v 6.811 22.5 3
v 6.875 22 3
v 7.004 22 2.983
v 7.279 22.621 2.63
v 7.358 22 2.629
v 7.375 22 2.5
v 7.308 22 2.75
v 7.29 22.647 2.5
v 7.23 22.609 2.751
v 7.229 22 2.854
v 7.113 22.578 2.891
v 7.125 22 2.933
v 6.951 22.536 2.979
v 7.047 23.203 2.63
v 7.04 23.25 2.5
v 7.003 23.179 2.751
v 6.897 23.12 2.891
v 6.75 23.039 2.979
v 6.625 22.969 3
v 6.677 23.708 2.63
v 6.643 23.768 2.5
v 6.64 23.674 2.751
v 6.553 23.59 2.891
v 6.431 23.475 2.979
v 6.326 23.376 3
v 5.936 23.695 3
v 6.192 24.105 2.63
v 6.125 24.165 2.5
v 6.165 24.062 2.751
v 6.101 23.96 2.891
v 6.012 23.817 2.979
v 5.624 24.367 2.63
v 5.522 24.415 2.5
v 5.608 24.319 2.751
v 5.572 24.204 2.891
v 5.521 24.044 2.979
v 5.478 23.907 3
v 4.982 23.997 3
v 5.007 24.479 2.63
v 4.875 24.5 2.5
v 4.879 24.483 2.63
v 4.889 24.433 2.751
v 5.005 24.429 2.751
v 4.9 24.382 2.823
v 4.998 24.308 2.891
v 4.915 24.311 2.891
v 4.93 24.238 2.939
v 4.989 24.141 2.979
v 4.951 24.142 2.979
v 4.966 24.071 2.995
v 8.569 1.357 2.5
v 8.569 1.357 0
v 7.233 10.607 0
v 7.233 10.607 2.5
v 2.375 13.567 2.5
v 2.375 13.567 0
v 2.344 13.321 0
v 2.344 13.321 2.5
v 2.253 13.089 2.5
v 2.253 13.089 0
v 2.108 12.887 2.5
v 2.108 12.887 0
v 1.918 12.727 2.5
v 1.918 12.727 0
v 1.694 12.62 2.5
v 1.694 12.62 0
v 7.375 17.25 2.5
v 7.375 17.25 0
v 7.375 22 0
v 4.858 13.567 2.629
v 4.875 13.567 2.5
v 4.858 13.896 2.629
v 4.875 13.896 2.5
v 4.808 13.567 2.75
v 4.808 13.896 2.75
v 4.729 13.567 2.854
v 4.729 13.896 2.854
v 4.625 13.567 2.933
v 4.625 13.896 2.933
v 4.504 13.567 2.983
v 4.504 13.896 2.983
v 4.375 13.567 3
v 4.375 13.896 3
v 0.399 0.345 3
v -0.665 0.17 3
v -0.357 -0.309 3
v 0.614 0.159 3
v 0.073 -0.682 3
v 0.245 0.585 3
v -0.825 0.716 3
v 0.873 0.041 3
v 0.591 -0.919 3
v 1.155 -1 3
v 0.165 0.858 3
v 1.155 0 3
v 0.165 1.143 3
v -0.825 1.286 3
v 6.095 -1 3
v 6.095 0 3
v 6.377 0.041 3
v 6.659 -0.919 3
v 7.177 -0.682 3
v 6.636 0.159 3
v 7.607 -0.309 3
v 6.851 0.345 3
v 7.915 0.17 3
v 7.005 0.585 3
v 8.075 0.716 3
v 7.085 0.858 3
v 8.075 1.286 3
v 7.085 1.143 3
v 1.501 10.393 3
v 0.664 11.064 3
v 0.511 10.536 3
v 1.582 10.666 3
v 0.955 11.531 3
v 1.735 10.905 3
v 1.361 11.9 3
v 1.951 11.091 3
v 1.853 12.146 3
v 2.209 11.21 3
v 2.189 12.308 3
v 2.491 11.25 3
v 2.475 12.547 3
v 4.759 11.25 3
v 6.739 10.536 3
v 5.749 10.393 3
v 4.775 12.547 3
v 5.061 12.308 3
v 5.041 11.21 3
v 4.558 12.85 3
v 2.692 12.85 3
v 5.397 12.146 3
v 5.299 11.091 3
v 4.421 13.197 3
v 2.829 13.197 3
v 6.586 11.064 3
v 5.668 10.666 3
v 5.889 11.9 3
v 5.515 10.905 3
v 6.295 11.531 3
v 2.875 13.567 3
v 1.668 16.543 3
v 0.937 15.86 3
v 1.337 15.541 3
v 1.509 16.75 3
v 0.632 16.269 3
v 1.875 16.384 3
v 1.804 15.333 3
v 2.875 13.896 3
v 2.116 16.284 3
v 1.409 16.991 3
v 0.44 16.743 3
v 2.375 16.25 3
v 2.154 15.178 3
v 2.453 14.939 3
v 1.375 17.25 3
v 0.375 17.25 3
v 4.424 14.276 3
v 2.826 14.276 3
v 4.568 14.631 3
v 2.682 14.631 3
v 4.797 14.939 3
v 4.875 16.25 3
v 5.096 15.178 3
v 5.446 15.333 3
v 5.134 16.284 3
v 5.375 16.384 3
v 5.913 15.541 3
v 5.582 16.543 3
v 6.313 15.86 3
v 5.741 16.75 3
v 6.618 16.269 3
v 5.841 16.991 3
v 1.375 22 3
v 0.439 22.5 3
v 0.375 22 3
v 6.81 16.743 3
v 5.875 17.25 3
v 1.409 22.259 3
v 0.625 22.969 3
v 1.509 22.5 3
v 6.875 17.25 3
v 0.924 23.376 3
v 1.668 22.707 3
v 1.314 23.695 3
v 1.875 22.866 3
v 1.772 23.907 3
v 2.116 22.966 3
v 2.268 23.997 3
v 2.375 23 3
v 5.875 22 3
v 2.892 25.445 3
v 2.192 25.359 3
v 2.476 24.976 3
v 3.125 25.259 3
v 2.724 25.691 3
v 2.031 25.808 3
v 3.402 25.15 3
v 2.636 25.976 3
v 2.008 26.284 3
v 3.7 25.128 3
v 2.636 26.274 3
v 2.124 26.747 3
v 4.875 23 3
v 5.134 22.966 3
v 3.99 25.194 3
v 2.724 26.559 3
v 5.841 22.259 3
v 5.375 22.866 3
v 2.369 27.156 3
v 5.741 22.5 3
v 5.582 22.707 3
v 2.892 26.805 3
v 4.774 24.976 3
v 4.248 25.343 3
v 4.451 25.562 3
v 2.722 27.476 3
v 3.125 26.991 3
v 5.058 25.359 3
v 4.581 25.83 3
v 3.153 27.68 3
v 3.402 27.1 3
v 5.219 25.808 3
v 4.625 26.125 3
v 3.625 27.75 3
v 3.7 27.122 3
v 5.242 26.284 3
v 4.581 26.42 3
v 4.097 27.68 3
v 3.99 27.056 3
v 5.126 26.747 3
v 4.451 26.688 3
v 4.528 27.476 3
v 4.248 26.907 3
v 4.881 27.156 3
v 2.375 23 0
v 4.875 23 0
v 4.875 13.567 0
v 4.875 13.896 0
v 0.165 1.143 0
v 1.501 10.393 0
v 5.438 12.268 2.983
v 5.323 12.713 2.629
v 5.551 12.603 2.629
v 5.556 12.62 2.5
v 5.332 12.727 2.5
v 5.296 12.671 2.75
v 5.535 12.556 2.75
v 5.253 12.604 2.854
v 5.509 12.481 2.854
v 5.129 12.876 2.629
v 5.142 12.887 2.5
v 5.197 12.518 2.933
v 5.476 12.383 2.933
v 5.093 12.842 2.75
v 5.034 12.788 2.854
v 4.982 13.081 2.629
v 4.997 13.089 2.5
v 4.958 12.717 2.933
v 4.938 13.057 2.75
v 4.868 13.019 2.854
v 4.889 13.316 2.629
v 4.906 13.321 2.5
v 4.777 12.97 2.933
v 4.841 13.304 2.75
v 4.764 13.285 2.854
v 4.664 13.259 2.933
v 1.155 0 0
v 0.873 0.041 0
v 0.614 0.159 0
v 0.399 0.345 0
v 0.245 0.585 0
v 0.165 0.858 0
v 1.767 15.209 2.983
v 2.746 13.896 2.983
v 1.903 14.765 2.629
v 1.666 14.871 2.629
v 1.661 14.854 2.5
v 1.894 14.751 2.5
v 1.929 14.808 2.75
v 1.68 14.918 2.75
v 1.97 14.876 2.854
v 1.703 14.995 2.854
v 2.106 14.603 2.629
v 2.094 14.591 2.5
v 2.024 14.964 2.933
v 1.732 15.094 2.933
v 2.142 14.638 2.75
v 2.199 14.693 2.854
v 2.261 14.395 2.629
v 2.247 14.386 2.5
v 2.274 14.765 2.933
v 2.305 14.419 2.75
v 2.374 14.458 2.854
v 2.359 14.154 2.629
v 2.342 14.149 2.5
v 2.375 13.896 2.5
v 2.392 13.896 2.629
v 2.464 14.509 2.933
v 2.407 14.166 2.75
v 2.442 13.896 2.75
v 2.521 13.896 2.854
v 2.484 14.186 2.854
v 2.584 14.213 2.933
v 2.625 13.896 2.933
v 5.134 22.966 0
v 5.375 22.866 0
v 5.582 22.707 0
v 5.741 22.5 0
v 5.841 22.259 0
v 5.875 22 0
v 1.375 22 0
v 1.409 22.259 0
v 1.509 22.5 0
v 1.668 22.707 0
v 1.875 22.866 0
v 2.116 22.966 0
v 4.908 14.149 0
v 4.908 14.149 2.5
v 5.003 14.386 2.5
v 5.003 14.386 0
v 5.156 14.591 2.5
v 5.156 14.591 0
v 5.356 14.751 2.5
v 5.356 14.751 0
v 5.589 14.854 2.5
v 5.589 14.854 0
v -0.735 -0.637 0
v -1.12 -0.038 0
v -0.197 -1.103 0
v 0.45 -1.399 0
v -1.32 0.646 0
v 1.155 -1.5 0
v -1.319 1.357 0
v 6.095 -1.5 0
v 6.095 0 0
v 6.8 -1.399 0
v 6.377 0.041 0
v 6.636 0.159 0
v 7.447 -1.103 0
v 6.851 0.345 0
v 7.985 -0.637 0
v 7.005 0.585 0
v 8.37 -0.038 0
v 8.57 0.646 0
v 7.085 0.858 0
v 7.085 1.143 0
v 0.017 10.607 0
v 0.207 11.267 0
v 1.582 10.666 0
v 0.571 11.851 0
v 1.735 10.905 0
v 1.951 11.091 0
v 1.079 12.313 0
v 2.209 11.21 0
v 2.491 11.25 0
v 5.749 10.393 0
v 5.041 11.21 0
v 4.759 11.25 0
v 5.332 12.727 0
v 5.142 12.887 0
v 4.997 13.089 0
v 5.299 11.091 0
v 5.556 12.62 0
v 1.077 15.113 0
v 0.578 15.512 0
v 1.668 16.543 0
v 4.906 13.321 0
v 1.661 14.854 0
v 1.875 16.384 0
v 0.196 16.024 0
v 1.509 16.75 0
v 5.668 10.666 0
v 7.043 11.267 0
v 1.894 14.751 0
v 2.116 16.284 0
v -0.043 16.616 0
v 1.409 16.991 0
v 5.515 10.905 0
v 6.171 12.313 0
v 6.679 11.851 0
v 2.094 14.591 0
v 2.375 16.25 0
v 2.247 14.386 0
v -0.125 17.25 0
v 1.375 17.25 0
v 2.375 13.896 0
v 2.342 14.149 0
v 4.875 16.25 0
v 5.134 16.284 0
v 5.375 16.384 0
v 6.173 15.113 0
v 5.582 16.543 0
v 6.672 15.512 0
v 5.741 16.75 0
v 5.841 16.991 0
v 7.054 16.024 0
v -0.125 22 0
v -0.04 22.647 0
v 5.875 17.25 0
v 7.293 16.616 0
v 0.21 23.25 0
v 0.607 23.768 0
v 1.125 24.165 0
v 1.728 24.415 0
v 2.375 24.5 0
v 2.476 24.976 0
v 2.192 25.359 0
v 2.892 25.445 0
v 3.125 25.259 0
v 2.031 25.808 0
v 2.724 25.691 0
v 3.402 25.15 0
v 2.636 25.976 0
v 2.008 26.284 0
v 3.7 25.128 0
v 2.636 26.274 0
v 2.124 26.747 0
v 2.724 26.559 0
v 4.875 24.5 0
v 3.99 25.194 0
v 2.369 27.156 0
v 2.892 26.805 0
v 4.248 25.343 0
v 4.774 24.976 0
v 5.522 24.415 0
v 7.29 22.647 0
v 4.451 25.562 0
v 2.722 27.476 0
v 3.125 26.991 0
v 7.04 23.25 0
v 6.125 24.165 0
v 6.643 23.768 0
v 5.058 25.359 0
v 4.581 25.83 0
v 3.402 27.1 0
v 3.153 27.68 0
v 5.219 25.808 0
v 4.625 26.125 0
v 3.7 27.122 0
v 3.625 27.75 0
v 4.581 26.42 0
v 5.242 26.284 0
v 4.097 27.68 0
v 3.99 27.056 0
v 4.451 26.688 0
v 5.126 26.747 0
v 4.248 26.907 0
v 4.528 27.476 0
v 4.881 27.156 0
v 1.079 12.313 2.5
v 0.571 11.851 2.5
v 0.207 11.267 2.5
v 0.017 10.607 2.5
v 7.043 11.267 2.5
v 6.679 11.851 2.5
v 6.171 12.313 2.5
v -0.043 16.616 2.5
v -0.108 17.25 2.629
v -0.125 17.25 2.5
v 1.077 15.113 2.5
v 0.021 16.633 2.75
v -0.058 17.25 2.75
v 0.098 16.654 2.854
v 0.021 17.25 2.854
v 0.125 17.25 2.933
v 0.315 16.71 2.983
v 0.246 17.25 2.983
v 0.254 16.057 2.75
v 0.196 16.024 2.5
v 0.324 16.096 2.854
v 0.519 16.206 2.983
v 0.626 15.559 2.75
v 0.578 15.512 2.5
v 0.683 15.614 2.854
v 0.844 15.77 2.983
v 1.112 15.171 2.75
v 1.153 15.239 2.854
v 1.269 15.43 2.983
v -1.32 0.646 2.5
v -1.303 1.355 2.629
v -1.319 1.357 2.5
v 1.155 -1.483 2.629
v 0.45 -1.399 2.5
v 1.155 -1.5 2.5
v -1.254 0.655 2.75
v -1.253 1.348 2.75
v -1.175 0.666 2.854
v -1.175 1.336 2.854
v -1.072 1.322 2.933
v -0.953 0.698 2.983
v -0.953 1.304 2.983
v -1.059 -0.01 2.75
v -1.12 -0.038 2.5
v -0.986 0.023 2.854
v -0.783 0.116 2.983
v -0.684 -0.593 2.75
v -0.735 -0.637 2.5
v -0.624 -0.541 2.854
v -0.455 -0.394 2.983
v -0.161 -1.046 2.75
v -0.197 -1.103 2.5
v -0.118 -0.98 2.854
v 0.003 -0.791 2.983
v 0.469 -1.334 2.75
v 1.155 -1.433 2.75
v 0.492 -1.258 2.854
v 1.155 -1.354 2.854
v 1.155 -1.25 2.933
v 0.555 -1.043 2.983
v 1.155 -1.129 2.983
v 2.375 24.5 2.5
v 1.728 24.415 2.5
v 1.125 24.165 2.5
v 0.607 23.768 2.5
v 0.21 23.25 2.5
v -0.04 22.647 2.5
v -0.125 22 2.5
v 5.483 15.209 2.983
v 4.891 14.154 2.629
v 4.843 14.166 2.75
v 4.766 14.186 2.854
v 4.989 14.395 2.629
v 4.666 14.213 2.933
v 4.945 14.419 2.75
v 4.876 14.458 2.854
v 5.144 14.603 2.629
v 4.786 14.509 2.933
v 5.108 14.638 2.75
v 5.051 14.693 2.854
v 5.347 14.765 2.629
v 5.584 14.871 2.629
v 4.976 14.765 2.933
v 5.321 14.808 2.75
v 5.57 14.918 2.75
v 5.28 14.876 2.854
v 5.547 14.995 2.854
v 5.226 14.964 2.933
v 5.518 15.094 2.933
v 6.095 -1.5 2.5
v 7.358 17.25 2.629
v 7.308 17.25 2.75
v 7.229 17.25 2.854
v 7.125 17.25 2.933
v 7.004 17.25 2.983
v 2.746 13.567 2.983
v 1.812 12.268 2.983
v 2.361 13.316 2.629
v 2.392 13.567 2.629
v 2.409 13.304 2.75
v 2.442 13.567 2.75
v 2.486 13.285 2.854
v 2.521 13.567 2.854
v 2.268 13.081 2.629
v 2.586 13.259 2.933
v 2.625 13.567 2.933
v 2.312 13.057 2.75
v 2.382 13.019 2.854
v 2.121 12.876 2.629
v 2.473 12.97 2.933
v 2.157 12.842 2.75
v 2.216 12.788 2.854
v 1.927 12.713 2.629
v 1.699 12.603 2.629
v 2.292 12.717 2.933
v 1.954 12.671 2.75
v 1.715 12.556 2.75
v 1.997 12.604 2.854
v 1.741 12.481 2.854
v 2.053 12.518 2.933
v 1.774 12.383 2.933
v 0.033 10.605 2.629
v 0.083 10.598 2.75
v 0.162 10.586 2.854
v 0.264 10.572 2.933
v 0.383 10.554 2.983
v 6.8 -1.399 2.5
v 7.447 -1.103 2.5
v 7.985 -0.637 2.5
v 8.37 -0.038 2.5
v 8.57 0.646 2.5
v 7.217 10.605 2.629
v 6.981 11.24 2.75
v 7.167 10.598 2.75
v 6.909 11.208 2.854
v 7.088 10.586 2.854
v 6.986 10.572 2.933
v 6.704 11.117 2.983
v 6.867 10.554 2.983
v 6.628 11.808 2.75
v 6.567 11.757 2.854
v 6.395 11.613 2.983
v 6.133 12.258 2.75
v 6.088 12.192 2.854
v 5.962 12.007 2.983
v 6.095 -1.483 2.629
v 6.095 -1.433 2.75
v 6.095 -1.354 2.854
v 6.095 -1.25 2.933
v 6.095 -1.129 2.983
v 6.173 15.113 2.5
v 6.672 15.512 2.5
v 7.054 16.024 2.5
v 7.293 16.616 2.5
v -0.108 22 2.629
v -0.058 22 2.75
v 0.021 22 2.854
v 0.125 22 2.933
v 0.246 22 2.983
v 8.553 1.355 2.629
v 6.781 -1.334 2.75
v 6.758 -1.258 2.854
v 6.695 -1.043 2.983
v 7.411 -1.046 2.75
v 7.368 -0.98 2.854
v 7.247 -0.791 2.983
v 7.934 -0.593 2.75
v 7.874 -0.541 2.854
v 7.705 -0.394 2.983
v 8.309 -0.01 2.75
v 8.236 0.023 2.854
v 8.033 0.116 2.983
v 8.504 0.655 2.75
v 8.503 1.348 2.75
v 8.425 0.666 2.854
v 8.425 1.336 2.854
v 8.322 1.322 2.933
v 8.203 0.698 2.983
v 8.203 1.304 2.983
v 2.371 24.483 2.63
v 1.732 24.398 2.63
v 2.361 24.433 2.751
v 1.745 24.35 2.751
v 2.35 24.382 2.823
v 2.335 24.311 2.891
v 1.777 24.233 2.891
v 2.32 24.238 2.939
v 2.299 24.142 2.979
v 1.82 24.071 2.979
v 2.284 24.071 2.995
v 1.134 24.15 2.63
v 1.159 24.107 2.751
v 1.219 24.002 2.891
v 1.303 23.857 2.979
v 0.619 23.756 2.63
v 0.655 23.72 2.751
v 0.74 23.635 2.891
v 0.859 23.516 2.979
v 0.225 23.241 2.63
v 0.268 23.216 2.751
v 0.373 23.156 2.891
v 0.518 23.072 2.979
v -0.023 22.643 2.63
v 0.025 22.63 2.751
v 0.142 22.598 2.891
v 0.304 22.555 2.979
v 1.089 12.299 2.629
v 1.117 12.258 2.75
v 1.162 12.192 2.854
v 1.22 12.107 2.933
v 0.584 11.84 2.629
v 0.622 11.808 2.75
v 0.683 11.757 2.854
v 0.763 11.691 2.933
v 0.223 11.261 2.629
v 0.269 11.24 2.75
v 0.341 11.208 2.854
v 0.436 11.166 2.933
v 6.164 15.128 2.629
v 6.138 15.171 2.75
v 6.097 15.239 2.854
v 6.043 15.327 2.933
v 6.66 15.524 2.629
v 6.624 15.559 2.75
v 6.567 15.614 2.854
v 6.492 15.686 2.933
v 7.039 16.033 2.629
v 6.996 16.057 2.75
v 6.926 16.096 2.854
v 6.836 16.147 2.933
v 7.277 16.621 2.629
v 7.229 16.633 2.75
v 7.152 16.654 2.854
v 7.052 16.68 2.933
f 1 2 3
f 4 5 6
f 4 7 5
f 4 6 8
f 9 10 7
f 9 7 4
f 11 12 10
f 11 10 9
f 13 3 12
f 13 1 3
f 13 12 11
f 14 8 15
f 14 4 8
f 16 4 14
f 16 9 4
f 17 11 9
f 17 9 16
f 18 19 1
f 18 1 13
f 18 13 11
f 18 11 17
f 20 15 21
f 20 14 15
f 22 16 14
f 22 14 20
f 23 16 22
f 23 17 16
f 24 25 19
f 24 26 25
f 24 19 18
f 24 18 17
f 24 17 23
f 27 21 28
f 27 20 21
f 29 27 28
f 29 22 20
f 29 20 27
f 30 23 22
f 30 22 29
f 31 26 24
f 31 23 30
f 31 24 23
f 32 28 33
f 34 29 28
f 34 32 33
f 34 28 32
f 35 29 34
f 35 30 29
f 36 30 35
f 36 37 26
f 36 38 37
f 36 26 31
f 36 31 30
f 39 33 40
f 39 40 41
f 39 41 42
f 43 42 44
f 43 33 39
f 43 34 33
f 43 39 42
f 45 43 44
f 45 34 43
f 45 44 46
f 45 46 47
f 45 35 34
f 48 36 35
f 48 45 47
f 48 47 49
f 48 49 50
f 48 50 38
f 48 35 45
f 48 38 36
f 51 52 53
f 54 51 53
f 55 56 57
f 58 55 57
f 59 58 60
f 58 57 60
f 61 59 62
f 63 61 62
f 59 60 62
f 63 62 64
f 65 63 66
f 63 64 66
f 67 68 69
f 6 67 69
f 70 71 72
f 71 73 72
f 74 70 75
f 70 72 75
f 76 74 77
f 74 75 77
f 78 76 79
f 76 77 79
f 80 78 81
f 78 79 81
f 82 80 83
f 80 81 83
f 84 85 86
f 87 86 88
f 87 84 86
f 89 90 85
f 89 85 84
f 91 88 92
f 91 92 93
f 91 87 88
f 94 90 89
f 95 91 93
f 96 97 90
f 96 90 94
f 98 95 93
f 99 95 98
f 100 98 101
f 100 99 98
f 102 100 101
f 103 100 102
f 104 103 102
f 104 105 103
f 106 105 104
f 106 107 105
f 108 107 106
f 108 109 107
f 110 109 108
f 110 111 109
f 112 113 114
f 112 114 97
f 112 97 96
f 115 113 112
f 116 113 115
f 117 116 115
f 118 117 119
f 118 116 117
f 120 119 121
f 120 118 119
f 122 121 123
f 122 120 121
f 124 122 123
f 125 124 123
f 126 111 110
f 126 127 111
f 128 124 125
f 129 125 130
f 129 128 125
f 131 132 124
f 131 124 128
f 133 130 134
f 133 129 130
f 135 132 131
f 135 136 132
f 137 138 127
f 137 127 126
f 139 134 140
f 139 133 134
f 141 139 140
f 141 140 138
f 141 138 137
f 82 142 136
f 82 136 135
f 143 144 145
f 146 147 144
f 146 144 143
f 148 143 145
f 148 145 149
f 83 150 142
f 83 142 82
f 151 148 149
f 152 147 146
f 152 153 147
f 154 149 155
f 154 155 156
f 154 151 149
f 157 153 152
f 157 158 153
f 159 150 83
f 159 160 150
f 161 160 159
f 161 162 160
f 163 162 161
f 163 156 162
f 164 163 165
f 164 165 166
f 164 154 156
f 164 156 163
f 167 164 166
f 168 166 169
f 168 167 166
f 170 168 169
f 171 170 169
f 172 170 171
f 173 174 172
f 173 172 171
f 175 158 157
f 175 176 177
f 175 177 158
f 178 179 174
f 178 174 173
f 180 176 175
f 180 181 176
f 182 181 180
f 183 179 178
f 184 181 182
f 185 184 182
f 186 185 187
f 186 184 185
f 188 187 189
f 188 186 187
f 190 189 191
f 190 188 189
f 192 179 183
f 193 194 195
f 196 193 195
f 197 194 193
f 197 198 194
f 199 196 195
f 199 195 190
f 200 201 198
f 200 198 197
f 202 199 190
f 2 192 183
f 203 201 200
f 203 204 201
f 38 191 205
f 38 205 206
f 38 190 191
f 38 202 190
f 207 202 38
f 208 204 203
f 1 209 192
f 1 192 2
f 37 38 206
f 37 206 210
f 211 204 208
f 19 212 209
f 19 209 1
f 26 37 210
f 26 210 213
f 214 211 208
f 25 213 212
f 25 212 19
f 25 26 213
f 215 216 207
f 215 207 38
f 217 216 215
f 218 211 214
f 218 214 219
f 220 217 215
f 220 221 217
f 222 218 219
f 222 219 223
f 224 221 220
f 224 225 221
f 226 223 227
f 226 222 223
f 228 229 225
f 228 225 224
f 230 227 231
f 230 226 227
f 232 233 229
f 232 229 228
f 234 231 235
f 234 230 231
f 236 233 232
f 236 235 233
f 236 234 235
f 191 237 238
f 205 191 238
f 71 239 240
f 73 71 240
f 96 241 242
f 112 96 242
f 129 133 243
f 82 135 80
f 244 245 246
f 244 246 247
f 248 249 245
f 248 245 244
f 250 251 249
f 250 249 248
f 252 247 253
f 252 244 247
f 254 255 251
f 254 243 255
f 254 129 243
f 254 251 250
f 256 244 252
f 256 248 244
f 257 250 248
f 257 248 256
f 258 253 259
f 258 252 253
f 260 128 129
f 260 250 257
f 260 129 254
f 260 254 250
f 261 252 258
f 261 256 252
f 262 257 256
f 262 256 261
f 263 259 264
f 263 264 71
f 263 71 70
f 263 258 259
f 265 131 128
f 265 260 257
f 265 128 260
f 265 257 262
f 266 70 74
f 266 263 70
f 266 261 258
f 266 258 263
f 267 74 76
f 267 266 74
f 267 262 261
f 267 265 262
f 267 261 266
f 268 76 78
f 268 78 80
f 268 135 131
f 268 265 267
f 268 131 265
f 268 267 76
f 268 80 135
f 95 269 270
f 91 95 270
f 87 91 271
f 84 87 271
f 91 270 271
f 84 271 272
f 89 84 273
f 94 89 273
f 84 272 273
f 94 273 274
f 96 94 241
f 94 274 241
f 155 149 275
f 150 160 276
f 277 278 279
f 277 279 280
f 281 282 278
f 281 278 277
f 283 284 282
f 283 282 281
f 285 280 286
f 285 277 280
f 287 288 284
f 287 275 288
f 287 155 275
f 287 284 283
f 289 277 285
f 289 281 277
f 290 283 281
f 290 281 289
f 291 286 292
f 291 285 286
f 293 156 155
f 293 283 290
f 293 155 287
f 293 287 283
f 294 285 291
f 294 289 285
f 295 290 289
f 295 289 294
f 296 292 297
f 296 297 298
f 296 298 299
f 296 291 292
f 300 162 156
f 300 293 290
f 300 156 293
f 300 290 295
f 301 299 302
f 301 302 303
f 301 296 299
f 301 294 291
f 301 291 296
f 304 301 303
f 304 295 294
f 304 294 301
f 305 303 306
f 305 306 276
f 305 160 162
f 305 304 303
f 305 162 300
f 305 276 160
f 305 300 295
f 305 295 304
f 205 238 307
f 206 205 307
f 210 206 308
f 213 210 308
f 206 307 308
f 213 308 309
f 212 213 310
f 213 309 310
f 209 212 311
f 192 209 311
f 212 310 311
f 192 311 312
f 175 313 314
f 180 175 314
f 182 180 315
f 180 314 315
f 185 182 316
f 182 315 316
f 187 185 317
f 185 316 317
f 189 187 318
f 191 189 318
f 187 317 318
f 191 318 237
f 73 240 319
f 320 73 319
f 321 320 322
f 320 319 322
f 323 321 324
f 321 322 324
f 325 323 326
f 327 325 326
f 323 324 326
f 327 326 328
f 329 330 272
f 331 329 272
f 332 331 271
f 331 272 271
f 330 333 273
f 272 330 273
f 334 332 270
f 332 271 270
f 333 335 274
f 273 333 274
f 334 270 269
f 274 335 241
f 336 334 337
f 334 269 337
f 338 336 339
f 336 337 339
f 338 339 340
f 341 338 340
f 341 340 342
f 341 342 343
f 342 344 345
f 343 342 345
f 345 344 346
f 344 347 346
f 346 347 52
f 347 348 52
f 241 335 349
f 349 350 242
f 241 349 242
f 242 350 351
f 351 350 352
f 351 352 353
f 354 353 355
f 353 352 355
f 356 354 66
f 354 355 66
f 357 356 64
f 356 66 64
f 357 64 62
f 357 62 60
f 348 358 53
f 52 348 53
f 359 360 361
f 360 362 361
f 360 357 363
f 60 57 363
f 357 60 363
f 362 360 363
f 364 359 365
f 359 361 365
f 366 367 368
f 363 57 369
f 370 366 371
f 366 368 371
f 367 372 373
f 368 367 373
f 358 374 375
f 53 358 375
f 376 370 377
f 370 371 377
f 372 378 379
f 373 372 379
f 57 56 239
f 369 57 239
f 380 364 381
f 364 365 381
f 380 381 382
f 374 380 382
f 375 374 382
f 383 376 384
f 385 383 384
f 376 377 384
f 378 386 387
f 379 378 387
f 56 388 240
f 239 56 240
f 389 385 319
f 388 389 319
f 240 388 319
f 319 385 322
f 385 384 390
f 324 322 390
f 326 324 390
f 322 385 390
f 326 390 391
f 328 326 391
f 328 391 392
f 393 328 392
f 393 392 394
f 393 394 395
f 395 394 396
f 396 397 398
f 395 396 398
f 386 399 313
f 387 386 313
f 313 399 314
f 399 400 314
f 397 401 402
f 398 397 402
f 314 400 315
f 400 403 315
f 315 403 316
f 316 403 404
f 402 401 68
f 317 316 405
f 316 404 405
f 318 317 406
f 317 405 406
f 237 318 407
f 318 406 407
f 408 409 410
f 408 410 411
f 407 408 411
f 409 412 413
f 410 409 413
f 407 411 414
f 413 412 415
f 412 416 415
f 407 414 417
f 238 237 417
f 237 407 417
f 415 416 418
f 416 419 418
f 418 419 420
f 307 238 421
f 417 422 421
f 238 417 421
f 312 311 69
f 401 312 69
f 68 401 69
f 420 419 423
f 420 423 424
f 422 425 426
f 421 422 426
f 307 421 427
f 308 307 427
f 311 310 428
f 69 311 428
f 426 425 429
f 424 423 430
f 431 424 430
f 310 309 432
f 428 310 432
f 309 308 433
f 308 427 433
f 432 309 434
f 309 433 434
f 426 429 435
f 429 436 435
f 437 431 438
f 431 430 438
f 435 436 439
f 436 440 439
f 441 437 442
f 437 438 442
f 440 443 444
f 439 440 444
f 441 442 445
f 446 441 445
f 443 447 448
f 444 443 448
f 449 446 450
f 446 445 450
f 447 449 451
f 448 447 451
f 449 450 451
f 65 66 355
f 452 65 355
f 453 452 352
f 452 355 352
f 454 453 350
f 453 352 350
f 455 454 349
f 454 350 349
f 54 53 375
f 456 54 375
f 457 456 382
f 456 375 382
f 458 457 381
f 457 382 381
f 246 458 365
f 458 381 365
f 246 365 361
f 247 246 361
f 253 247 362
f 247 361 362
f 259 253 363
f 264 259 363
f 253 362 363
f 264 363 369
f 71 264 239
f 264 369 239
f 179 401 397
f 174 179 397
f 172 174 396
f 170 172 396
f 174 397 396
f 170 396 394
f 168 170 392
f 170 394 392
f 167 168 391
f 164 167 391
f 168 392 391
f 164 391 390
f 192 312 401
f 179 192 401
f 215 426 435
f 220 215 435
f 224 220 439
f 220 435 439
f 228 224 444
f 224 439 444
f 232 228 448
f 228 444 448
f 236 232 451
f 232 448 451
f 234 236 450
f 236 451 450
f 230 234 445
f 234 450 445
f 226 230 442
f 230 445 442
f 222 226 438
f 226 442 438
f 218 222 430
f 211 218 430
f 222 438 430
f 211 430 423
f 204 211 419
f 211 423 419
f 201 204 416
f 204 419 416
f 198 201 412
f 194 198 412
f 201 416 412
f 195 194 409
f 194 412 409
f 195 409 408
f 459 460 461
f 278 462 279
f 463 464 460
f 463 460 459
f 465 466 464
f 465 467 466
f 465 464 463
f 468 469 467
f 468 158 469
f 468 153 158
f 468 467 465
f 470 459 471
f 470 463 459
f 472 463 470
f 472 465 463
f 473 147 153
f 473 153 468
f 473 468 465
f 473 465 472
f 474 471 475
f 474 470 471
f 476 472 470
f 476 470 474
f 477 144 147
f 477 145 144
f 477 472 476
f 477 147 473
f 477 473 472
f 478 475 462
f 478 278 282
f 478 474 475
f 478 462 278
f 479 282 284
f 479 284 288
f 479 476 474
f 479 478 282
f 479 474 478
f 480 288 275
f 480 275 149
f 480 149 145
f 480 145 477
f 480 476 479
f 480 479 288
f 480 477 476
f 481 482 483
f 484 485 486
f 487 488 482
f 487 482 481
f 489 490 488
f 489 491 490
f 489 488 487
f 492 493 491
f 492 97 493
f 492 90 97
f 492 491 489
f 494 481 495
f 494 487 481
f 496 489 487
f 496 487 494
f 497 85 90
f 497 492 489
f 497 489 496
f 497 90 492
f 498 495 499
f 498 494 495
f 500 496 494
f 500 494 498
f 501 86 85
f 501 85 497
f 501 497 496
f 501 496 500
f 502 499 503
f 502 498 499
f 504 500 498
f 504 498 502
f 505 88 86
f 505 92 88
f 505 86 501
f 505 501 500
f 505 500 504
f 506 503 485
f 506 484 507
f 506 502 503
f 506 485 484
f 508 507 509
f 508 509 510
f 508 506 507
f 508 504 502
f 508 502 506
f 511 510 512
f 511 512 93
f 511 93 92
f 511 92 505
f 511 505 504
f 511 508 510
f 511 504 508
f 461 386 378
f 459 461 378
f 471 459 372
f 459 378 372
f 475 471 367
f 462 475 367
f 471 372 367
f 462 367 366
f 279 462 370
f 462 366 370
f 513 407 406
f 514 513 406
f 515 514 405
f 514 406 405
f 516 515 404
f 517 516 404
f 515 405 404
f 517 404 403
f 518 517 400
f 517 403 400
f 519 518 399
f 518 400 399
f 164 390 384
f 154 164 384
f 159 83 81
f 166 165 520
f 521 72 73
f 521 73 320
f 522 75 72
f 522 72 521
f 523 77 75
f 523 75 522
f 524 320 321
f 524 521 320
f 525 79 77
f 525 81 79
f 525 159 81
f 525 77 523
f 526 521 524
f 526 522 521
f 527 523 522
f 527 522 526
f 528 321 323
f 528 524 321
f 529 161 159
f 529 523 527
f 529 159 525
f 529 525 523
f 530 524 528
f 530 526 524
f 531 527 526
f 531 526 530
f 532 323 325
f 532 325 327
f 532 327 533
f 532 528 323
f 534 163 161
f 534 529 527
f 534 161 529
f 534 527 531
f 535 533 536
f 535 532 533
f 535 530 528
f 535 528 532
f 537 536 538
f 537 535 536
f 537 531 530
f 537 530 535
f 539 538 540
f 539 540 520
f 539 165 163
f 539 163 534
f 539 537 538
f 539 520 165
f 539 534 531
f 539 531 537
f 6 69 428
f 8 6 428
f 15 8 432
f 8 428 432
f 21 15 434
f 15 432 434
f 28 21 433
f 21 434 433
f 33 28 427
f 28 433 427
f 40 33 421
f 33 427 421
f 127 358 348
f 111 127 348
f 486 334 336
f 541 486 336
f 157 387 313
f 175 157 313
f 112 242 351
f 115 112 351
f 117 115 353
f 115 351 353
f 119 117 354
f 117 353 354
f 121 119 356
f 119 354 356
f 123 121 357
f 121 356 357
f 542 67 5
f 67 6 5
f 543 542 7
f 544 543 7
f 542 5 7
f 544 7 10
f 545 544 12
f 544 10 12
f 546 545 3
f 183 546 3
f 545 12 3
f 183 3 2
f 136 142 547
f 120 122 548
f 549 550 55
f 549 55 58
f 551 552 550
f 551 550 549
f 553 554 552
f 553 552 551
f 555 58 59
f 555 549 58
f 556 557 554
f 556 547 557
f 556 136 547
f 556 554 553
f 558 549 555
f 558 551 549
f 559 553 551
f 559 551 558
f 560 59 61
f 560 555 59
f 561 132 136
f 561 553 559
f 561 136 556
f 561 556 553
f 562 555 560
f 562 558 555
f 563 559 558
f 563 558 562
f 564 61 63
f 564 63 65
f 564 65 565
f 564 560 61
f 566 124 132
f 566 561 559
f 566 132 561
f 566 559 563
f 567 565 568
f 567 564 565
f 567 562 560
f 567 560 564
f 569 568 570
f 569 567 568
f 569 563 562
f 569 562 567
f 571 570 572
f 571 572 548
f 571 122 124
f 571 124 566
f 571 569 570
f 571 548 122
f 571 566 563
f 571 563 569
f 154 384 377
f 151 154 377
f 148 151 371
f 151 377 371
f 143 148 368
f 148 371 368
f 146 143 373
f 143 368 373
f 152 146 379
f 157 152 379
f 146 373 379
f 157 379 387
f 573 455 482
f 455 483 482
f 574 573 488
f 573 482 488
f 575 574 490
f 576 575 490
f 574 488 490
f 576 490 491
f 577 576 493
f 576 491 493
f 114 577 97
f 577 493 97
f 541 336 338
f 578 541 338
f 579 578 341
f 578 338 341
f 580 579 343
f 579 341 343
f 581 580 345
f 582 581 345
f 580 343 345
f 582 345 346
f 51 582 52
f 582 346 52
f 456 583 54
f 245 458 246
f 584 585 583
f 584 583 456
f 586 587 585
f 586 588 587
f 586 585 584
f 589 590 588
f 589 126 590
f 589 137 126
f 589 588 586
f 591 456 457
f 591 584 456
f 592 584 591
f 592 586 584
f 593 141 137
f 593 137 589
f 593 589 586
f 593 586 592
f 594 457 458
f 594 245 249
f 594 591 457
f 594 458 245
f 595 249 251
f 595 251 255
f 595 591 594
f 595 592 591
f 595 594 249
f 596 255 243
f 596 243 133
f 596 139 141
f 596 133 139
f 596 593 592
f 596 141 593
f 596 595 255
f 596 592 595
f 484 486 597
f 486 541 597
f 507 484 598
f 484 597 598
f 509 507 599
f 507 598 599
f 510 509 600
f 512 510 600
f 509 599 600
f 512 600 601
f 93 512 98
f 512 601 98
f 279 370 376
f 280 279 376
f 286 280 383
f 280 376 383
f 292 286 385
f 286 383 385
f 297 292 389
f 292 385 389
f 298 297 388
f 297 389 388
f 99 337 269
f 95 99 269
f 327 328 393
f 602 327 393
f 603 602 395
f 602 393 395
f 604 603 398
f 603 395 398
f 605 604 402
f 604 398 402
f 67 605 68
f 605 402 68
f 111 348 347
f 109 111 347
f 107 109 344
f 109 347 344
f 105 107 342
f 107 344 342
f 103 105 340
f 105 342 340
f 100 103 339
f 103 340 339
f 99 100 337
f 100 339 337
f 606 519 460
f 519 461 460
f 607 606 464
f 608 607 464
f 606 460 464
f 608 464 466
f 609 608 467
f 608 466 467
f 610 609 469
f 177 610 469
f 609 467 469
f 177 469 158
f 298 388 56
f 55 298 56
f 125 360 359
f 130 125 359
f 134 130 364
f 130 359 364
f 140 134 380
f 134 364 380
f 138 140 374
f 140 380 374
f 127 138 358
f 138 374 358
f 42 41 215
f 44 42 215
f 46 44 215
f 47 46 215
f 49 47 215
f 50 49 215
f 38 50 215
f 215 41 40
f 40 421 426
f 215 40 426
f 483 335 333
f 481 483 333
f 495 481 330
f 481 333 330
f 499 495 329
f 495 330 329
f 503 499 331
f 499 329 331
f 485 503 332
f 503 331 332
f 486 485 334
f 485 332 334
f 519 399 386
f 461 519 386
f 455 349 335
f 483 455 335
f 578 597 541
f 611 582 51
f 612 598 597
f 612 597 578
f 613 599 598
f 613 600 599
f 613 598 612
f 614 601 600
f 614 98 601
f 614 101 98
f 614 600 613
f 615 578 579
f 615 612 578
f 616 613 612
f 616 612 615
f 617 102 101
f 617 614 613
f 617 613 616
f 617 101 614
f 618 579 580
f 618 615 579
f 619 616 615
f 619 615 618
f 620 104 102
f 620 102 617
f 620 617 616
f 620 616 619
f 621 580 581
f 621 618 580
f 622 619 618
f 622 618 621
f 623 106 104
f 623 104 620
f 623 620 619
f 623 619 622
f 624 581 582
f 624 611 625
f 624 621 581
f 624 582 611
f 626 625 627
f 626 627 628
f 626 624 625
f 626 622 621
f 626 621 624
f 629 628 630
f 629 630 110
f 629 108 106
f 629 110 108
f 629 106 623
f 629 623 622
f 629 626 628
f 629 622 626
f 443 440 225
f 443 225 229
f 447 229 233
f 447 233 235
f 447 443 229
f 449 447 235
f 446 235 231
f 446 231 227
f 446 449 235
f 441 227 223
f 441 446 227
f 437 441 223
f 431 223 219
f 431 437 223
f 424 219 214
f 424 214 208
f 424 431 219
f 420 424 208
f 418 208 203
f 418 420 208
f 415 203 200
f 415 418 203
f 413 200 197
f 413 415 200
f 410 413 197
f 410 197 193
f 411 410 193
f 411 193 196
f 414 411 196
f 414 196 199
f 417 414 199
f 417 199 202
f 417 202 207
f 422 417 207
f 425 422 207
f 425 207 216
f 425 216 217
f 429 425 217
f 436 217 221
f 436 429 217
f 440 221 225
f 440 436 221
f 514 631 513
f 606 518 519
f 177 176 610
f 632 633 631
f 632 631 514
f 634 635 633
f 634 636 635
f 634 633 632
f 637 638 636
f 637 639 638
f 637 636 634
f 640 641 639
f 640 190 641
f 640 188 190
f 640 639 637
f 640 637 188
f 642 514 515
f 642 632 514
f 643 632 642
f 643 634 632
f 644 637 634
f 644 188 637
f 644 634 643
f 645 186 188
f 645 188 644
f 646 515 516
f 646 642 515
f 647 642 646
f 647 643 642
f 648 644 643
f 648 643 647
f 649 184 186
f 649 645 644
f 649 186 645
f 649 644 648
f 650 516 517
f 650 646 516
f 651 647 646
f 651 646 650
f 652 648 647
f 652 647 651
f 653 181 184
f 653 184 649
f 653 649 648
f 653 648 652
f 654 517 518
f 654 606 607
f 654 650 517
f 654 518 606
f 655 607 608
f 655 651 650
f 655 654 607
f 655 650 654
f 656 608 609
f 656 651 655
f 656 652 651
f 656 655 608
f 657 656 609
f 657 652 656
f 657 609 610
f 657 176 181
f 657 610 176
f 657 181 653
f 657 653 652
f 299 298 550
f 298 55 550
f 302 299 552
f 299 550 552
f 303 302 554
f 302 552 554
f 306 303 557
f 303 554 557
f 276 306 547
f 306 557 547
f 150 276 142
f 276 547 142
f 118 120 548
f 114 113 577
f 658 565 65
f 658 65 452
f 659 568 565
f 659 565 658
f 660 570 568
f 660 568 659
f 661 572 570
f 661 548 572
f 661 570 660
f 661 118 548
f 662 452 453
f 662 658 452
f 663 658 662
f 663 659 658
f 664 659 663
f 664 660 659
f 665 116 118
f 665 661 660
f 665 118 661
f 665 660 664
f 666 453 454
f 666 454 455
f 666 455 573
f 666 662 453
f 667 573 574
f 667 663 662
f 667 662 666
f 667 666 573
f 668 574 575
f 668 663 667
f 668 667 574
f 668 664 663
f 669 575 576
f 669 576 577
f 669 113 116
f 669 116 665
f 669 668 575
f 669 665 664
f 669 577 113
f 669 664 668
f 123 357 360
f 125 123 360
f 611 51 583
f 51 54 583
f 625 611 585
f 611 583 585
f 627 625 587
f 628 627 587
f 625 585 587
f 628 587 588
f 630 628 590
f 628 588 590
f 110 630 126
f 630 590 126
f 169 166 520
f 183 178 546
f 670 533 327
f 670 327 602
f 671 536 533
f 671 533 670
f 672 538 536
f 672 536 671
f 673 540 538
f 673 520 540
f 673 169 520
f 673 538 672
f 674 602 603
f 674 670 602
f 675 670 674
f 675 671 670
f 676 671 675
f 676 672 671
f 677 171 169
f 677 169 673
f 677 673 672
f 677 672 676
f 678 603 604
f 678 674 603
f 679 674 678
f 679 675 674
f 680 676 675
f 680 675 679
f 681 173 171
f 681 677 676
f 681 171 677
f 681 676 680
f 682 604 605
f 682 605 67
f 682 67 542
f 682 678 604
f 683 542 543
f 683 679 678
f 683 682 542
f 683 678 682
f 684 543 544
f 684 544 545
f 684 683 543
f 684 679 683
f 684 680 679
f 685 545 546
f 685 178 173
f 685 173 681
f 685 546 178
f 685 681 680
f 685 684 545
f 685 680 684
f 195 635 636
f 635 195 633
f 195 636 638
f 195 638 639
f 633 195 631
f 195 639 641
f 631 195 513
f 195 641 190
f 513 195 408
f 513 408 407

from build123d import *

# Parameters (mm, degrees)
F0_R     = 1
F1_DEPTH = 3
F2_R     = 0.5


with BuildPart() as f1:
    # F0 (on Top) → F1 (new body)
    with BuildSketch(Plane.XY):
        with BuildLine():
            Line((-0.125, 22), (-0.125, 17.25))
            ThreePointArc((-0.125, 17.25), (0.370541, 15.755964), (1.660714, 14.854213))
            ThreePointArc((1.660714, 14.854213), (2.176784, 14.493512), (2.375, 13.895898))
            Line((2.375, 13.895898), (2.375, 13.567332))
            ThreePointArc((2.375, 13.567332), (2.187046, 12.983739), (1.693838, 12.619523))
            ThreePointArc((1.693838, 12.619523), (0.570596, 11.850719), (0.016613, 10.607402))
            Line((0.016613, 10.607402), (-1.319498, 1.357402))
            ThreePointArc((-1.319498, 1.357402), (-0.735085, -0.636535), (1.154823, -1.5))
            Line((1.154823, -1.5), (6.095177, -1.5))
            ThreePointArc((6.095177, -1.5), (7.985085, -0.636535), (8.569498, 1.357402))
            Line((8.569498, 1.357402), (7.233387, 10.607402))
            ThreePointArc((7.233387, 10.607402), (6.679404, 11.850719), (5.556162, 12.619523))
            ThreePointArc((5.556162, 12.619523), (5.062954, 12.983739), (4.875, 13.567332))
            Line((4.875, 13.567332), (4.875, 13.895898))
            ThreePointArc((4.875, 13.895898), (5.073216, 14.493512), (5.589286, 14.854213))
            ThreePointArc((5.589286, 14.854213), (6.879459, 15.755964), (7.375, 17.25))
            Line((7.375, 17.25), (7.375, 22))
            ThreePointArc((7.375, 22), (6.642767, 23.767767), (4.875, 24.5))
            Line((4.875, 24.5), (4.774049, 24.975951))
            ThreePointArc((4.774049, 24.975951), (3.625, 27.75), (2.475951, 24.975951))
            Line((2.475951, 24.975951), (2.375, 24.5))
            ThreePointArc((2.375, 24.5), (0.607233, 23.767767), (-0.125, 22))
        make_face()
        with BuildLine():
            Line((6.095177, 0), (1.154823, 0))
            ThreePointArc((1.154823, 0), (0.398859, 0.345386), (0.165094, 1.142961))
            Line((0.165094, 1.142961), (1.501205, 10.392961))
            ThreePointArc((1.501205, 10.392961), (1.83632, 11.005963), (2.490934, 11.25))
            Line((2.490934, 11.25), (3.625, 11.25))
            Line((3.625, 11.25), (4.759066, 11.25))
            ThreePointArc((4.759066, 11.25), (5.41368, 11.005963), (5.748795, 10.392961))
            Line((5.748795, 10.392961), (7.084906, 1.142961))
            ThreePointArc((7.084906, 1.142961), (6.851141, 0.345386), (6.095177, 0))
        make_face(mode=Mode.SUBTRACT)
        with BuildLine():
            Line((4.875, 16.25), (3.625, 16.25))
            Line((3.625, 16.25), (2.375, 16.25))
            ThreePointArc((2.375, 16.25), (1.667893, 16.542893), (1.375, 17.25))
            Line((1.375, 17.25), (1.375, 22))
            ThreePointArc((1.375, 22), (1.667893, 22.707107), (2.375, 23))
            Line((2.375, 23), (4.875, 23))
            ThreePointArc((4.875, 23), (5.582107, 22.707107), (5.875, 22))
            Line((5.875, 22), (5.875, 17.25))
            ThreePointArc((5.875, 17.25), (5.582107, 16.542893), (4.875, 16.25))
        make_face(mode=Mode.SUBTRACT)
        with Locations((3.625, 26.125)):
            Circle(F0_R, mode=Mode.SUBTRACT)
    extrude(amount=F1_DEPTH)

    # F2
    f2_edges = [f1.edges().sort_by_distance(p)[0] for p in [
        (7.901443, 5.982402, 3),
    ]]
    fillet(f2_edges, radius=F2_R)


solid = f1.part
